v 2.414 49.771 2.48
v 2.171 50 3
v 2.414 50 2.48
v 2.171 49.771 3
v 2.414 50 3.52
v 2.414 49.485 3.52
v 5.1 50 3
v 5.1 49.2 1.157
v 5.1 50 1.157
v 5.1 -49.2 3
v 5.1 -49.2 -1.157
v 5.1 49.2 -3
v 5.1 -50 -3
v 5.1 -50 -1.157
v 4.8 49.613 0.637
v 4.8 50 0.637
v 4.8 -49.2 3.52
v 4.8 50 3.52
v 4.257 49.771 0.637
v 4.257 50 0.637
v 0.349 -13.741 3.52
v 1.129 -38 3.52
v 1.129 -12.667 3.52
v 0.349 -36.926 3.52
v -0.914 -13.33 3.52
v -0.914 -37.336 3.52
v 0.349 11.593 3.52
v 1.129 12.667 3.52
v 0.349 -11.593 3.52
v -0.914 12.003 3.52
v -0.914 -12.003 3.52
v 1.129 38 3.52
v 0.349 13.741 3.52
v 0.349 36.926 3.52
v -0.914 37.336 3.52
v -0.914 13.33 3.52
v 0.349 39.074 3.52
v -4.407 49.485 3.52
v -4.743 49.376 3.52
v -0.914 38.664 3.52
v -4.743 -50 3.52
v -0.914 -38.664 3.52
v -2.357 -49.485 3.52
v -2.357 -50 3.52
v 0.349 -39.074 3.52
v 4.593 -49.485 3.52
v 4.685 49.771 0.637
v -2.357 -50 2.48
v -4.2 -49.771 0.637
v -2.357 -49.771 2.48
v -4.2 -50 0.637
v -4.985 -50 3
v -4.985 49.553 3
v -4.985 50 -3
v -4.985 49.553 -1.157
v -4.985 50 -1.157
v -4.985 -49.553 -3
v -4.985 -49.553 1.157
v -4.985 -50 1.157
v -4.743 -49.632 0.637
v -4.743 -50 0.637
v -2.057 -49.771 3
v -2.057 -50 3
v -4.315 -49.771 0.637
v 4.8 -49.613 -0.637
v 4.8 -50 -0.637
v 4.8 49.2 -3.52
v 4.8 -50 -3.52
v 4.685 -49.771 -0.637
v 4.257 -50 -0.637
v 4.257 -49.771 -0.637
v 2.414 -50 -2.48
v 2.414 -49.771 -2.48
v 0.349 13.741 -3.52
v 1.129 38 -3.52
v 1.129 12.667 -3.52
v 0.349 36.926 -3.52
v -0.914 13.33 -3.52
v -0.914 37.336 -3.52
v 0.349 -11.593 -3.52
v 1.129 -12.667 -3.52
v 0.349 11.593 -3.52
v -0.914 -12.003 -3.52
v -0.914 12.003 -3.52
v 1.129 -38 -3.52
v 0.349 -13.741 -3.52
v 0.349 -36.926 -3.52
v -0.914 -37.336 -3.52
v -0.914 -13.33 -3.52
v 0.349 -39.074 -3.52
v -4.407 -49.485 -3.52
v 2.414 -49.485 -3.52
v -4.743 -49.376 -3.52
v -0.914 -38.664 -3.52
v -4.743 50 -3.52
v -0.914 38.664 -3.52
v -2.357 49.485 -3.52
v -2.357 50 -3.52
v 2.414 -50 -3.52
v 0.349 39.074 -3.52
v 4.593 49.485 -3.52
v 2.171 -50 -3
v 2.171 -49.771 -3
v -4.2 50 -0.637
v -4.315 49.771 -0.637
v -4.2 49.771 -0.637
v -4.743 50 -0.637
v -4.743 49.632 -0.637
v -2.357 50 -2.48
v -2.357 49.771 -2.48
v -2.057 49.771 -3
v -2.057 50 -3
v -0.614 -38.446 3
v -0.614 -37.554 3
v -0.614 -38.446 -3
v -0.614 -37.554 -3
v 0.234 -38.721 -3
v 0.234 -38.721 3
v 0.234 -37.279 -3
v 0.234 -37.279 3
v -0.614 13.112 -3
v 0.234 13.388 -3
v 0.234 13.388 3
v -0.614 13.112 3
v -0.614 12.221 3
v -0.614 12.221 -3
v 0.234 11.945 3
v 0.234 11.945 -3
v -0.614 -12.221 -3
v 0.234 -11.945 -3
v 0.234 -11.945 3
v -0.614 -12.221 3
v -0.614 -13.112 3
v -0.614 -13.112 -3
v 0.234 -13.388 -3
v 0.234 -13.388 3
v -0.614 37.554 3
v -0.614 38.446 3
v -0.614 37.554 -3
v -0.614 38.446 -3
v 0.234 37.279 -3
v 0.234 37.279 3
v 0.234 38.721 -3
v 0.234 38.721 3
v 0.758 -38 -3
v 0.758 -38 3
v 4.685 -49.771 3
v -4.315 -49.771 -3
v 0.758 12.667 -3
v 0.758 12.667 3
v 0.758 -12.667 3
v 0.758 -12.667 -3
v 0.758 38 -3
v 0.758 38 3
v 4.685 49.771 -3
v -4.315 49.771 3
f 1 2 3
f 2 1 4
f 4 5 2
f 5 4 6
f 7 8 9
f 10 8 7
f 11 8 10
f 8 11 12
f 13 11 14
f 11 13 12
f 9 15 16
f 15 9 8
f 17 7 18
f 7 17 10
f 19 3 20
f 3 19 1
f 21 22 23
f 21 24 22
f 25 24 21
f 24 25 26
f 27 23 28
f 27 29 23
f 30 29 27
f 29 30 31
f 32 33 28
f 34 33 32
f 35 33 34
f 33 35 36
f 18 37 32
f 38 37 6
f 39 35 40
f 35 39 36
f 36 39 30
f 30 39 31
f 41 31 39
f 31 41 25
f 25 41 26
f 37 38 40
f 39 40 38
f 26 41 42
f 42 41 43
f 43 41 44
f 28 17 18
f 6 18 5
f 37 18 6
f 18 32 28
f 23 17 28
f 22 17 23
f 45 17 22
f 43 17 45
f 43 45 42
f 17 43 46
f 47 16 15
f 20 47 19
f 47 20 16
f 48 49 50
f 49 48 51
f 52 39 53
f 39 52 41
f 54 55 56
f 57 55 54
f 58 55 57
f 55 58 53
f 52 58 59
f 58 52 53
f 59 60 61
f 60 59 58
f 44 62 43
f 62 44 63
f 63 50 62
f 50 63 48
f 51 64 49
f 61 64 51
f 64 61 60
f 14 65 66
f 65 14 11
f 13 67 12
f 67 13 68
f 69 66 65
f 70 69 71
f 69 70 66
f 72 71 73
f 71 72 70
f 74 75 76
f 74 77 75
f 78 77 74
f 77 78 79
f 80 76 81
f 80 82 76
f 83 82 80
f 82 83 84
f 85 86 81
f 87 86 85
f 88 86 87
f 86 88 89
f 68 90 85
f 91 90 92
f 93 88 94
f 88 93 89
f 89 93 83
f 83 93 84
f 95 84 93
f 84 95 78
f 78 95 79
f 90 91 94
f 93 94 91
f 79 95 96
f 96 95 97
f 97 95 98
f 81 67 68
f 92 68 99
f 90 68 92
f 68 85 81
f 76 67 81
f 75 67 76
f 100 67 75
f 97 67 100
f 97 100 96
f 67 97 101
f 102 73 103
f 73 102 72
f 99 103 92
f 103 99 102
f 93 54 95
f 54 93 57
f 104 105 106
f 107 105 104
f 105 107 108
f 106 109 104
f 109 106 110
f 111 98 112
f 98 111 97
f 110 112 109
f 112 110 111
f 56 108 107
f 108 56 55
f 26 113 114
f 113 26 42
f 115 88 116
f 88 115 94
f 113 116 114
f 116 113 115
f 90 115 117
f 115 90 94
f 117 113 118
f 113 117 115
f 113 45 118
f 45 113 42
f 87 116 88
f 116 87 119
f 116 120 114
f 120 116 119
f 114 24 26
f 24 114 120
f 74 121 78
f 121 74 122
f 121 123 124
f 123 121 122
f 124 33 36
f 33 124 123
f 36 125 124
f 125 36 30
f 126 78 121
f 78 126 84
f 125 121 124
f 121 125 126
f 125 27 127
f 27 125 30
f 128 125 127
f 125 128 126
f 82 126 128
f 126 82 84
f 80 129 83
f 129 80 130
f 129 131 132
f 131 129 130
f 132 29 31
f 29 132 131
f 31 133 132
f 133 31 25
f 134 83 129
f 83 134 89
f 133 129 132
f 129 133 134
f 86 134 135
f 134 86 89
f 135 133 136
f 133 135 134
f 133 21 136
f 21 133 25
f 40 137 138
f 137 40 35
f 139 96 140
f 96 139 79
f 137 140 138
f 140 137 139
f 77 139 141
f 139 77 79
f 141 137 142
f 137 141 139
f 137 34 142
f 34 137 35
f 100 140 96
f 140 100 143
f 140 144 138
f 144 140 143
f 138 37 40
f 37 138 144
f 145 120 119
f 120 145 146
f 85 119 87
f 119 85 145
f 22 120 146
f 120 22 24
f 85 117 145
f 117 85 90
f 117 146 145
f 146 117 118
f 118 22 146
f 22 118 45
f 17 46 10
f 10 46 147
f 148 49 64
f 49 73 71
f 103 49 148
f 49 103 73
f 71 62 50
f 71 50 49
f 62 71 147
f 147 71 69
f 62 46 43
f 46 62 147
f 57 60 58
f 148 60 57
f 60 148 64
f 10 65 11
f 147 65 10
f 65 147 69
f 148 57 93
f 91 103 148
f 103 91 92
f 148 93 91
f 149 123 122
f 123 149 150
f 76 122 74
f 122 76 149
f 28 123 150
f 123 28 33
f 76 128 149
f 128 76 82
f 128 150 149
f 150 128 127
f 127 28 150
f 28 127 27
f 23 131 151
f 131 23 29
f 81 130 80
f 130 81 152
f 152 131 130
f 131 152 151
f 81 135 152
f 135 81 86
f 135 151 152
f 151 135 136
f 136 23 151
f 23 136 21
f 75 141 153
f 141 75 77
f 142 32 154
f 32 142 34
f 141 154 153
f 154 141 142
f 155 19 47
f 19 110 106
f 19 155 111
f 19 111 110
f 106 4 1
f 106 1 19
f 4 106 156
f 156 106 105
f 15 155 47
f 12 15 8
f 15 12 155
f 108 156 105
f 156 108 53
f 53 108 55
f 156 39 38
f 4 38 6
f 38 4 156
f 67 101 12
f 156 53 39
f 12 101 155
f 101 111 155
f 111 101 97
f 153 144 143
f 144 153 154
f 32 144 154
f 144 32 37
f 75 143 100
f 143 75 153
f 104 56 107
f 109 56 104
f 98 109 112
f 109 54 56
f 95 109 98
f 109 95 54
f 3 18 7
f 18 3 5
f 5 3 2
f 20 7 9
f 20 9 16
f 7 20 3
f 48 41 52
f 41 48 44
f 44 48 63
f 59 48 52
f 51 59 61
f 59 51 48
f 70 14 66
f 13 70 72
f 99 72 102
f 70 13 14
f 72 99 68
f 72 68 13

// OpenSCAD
// Parameters
rail_length = 100.0; //[50.0:200.0:1]
rail_width = 9.0; //[4.5:18.0:0.5]
rail_height = 6.0; //[3.0:12.0:0.5]
hole_diameter = 3.0; //[1.5:6.0:0.25]
hole_count = 4; //[2:8:1]
end_margin = 12.0; //[6.0:24.0:1]
chamfer_size = 0.8; //[0.3:2.0:0.1]
fillet_radius = 0.6; //[0.2:1.5:0.1]
fillet_trim = 1.2; //[0.6:3.0:0.1]
engrave_depth = 0.2; //[0.1:0.6:0.05]
engrave_groove_width = 0.6; //[0.3:1.5:0.1]
engrave_groove_length = 18.0; //[8.0:40.0:1]
engrave_offset_from_top = 1.0; //[0.5:2.5:0.1]
overlap = 1.0; //[0.5:2.0:0.1]

// Rail Body
module rail_body() {
  translate([0, 0, 0])
    cube([rail_width, rail_length, rail_height], center=true);
}

// Mounting Holes
module mounting_holes() {
  union() {
    translate([0, -rail_length/2 + end_margin, 0])
      cylinder(h=rail_height + 2*overlap, r=hole_diameter/2, center=true);
    translate([0, -rail_length/2 + end_margin + (rail_length - 2*end_margin)/3, 0])
      cylinder(h=rail_height + 2*overlap, r=hole_diameter/2, center=true);
    translate([0, -rail_length/2 + end_margin + 2*(rail_length - 2*end_margin)/3, 0])
      cylinder(h=rail_height + 2*overlap, r=hole_diameter/2, center=true);
    translate([0, rail_length/2 - end_margin, 0])
      cylinder(h=rail_height + 2*overlap, r=hole_diameter/2, center=true);
  }
}

// End Chamfers
module end_chamfers() {
  union() {
    translate([0, rail_length/2 - chamfer_size/2, 0])
      rotate([0, 45, 0])
        cube([rail_width + 2*overlap, chamfer_size, rail_height + 2*overlap], center=true);
    translate([0, -rail_length/2 + chamfer_size/2, 0])
      rotate([0, -45, 0])
        cube([rail_width + 2*overlap, chamfer_size, rail_height + 2*overlap], center=true);
  }
}

// Engraved Markings
module engraved_markings() {
  union() {
    translate([-rail_width/4, 0, rail_height/2 - engrave_offset_from_top - (engrave_depth + overlap)/2])
      cube([engrave_groove_width, engrave_groove_length, engrave_depth + overlap], center=true);
    translate([rail_width/4, 0, rail_height/2 - engrave_offset_from_top - (engrave_depth + overlap)/2])
      cube([engrave_groove_width, engrave_groove_length, engrave_depth + overlap], center=true);
  }
}

// Edge Fillets
module edge_fillets() {
  intersection() {
    minkowski() {
      difference() {
        difference() {
          difference() {
            rail_body();
            mounting_holes();
          }
          end_chamfers();
        }
        engraved_markings();
      }
      sphere(r=fillet_radius, center=true);
    }
    translate([0, 0, 0])
      cube([rail_width + 4*fillet_radius + 2*overlap, rail_length, rail_height + 4*fillet_radius + 2*overlap], center=true);
  }
}

// Final Output
color([0.85, 0.85, 0.8]) // Off-white for 3D printed PLA
edge_fillets();
